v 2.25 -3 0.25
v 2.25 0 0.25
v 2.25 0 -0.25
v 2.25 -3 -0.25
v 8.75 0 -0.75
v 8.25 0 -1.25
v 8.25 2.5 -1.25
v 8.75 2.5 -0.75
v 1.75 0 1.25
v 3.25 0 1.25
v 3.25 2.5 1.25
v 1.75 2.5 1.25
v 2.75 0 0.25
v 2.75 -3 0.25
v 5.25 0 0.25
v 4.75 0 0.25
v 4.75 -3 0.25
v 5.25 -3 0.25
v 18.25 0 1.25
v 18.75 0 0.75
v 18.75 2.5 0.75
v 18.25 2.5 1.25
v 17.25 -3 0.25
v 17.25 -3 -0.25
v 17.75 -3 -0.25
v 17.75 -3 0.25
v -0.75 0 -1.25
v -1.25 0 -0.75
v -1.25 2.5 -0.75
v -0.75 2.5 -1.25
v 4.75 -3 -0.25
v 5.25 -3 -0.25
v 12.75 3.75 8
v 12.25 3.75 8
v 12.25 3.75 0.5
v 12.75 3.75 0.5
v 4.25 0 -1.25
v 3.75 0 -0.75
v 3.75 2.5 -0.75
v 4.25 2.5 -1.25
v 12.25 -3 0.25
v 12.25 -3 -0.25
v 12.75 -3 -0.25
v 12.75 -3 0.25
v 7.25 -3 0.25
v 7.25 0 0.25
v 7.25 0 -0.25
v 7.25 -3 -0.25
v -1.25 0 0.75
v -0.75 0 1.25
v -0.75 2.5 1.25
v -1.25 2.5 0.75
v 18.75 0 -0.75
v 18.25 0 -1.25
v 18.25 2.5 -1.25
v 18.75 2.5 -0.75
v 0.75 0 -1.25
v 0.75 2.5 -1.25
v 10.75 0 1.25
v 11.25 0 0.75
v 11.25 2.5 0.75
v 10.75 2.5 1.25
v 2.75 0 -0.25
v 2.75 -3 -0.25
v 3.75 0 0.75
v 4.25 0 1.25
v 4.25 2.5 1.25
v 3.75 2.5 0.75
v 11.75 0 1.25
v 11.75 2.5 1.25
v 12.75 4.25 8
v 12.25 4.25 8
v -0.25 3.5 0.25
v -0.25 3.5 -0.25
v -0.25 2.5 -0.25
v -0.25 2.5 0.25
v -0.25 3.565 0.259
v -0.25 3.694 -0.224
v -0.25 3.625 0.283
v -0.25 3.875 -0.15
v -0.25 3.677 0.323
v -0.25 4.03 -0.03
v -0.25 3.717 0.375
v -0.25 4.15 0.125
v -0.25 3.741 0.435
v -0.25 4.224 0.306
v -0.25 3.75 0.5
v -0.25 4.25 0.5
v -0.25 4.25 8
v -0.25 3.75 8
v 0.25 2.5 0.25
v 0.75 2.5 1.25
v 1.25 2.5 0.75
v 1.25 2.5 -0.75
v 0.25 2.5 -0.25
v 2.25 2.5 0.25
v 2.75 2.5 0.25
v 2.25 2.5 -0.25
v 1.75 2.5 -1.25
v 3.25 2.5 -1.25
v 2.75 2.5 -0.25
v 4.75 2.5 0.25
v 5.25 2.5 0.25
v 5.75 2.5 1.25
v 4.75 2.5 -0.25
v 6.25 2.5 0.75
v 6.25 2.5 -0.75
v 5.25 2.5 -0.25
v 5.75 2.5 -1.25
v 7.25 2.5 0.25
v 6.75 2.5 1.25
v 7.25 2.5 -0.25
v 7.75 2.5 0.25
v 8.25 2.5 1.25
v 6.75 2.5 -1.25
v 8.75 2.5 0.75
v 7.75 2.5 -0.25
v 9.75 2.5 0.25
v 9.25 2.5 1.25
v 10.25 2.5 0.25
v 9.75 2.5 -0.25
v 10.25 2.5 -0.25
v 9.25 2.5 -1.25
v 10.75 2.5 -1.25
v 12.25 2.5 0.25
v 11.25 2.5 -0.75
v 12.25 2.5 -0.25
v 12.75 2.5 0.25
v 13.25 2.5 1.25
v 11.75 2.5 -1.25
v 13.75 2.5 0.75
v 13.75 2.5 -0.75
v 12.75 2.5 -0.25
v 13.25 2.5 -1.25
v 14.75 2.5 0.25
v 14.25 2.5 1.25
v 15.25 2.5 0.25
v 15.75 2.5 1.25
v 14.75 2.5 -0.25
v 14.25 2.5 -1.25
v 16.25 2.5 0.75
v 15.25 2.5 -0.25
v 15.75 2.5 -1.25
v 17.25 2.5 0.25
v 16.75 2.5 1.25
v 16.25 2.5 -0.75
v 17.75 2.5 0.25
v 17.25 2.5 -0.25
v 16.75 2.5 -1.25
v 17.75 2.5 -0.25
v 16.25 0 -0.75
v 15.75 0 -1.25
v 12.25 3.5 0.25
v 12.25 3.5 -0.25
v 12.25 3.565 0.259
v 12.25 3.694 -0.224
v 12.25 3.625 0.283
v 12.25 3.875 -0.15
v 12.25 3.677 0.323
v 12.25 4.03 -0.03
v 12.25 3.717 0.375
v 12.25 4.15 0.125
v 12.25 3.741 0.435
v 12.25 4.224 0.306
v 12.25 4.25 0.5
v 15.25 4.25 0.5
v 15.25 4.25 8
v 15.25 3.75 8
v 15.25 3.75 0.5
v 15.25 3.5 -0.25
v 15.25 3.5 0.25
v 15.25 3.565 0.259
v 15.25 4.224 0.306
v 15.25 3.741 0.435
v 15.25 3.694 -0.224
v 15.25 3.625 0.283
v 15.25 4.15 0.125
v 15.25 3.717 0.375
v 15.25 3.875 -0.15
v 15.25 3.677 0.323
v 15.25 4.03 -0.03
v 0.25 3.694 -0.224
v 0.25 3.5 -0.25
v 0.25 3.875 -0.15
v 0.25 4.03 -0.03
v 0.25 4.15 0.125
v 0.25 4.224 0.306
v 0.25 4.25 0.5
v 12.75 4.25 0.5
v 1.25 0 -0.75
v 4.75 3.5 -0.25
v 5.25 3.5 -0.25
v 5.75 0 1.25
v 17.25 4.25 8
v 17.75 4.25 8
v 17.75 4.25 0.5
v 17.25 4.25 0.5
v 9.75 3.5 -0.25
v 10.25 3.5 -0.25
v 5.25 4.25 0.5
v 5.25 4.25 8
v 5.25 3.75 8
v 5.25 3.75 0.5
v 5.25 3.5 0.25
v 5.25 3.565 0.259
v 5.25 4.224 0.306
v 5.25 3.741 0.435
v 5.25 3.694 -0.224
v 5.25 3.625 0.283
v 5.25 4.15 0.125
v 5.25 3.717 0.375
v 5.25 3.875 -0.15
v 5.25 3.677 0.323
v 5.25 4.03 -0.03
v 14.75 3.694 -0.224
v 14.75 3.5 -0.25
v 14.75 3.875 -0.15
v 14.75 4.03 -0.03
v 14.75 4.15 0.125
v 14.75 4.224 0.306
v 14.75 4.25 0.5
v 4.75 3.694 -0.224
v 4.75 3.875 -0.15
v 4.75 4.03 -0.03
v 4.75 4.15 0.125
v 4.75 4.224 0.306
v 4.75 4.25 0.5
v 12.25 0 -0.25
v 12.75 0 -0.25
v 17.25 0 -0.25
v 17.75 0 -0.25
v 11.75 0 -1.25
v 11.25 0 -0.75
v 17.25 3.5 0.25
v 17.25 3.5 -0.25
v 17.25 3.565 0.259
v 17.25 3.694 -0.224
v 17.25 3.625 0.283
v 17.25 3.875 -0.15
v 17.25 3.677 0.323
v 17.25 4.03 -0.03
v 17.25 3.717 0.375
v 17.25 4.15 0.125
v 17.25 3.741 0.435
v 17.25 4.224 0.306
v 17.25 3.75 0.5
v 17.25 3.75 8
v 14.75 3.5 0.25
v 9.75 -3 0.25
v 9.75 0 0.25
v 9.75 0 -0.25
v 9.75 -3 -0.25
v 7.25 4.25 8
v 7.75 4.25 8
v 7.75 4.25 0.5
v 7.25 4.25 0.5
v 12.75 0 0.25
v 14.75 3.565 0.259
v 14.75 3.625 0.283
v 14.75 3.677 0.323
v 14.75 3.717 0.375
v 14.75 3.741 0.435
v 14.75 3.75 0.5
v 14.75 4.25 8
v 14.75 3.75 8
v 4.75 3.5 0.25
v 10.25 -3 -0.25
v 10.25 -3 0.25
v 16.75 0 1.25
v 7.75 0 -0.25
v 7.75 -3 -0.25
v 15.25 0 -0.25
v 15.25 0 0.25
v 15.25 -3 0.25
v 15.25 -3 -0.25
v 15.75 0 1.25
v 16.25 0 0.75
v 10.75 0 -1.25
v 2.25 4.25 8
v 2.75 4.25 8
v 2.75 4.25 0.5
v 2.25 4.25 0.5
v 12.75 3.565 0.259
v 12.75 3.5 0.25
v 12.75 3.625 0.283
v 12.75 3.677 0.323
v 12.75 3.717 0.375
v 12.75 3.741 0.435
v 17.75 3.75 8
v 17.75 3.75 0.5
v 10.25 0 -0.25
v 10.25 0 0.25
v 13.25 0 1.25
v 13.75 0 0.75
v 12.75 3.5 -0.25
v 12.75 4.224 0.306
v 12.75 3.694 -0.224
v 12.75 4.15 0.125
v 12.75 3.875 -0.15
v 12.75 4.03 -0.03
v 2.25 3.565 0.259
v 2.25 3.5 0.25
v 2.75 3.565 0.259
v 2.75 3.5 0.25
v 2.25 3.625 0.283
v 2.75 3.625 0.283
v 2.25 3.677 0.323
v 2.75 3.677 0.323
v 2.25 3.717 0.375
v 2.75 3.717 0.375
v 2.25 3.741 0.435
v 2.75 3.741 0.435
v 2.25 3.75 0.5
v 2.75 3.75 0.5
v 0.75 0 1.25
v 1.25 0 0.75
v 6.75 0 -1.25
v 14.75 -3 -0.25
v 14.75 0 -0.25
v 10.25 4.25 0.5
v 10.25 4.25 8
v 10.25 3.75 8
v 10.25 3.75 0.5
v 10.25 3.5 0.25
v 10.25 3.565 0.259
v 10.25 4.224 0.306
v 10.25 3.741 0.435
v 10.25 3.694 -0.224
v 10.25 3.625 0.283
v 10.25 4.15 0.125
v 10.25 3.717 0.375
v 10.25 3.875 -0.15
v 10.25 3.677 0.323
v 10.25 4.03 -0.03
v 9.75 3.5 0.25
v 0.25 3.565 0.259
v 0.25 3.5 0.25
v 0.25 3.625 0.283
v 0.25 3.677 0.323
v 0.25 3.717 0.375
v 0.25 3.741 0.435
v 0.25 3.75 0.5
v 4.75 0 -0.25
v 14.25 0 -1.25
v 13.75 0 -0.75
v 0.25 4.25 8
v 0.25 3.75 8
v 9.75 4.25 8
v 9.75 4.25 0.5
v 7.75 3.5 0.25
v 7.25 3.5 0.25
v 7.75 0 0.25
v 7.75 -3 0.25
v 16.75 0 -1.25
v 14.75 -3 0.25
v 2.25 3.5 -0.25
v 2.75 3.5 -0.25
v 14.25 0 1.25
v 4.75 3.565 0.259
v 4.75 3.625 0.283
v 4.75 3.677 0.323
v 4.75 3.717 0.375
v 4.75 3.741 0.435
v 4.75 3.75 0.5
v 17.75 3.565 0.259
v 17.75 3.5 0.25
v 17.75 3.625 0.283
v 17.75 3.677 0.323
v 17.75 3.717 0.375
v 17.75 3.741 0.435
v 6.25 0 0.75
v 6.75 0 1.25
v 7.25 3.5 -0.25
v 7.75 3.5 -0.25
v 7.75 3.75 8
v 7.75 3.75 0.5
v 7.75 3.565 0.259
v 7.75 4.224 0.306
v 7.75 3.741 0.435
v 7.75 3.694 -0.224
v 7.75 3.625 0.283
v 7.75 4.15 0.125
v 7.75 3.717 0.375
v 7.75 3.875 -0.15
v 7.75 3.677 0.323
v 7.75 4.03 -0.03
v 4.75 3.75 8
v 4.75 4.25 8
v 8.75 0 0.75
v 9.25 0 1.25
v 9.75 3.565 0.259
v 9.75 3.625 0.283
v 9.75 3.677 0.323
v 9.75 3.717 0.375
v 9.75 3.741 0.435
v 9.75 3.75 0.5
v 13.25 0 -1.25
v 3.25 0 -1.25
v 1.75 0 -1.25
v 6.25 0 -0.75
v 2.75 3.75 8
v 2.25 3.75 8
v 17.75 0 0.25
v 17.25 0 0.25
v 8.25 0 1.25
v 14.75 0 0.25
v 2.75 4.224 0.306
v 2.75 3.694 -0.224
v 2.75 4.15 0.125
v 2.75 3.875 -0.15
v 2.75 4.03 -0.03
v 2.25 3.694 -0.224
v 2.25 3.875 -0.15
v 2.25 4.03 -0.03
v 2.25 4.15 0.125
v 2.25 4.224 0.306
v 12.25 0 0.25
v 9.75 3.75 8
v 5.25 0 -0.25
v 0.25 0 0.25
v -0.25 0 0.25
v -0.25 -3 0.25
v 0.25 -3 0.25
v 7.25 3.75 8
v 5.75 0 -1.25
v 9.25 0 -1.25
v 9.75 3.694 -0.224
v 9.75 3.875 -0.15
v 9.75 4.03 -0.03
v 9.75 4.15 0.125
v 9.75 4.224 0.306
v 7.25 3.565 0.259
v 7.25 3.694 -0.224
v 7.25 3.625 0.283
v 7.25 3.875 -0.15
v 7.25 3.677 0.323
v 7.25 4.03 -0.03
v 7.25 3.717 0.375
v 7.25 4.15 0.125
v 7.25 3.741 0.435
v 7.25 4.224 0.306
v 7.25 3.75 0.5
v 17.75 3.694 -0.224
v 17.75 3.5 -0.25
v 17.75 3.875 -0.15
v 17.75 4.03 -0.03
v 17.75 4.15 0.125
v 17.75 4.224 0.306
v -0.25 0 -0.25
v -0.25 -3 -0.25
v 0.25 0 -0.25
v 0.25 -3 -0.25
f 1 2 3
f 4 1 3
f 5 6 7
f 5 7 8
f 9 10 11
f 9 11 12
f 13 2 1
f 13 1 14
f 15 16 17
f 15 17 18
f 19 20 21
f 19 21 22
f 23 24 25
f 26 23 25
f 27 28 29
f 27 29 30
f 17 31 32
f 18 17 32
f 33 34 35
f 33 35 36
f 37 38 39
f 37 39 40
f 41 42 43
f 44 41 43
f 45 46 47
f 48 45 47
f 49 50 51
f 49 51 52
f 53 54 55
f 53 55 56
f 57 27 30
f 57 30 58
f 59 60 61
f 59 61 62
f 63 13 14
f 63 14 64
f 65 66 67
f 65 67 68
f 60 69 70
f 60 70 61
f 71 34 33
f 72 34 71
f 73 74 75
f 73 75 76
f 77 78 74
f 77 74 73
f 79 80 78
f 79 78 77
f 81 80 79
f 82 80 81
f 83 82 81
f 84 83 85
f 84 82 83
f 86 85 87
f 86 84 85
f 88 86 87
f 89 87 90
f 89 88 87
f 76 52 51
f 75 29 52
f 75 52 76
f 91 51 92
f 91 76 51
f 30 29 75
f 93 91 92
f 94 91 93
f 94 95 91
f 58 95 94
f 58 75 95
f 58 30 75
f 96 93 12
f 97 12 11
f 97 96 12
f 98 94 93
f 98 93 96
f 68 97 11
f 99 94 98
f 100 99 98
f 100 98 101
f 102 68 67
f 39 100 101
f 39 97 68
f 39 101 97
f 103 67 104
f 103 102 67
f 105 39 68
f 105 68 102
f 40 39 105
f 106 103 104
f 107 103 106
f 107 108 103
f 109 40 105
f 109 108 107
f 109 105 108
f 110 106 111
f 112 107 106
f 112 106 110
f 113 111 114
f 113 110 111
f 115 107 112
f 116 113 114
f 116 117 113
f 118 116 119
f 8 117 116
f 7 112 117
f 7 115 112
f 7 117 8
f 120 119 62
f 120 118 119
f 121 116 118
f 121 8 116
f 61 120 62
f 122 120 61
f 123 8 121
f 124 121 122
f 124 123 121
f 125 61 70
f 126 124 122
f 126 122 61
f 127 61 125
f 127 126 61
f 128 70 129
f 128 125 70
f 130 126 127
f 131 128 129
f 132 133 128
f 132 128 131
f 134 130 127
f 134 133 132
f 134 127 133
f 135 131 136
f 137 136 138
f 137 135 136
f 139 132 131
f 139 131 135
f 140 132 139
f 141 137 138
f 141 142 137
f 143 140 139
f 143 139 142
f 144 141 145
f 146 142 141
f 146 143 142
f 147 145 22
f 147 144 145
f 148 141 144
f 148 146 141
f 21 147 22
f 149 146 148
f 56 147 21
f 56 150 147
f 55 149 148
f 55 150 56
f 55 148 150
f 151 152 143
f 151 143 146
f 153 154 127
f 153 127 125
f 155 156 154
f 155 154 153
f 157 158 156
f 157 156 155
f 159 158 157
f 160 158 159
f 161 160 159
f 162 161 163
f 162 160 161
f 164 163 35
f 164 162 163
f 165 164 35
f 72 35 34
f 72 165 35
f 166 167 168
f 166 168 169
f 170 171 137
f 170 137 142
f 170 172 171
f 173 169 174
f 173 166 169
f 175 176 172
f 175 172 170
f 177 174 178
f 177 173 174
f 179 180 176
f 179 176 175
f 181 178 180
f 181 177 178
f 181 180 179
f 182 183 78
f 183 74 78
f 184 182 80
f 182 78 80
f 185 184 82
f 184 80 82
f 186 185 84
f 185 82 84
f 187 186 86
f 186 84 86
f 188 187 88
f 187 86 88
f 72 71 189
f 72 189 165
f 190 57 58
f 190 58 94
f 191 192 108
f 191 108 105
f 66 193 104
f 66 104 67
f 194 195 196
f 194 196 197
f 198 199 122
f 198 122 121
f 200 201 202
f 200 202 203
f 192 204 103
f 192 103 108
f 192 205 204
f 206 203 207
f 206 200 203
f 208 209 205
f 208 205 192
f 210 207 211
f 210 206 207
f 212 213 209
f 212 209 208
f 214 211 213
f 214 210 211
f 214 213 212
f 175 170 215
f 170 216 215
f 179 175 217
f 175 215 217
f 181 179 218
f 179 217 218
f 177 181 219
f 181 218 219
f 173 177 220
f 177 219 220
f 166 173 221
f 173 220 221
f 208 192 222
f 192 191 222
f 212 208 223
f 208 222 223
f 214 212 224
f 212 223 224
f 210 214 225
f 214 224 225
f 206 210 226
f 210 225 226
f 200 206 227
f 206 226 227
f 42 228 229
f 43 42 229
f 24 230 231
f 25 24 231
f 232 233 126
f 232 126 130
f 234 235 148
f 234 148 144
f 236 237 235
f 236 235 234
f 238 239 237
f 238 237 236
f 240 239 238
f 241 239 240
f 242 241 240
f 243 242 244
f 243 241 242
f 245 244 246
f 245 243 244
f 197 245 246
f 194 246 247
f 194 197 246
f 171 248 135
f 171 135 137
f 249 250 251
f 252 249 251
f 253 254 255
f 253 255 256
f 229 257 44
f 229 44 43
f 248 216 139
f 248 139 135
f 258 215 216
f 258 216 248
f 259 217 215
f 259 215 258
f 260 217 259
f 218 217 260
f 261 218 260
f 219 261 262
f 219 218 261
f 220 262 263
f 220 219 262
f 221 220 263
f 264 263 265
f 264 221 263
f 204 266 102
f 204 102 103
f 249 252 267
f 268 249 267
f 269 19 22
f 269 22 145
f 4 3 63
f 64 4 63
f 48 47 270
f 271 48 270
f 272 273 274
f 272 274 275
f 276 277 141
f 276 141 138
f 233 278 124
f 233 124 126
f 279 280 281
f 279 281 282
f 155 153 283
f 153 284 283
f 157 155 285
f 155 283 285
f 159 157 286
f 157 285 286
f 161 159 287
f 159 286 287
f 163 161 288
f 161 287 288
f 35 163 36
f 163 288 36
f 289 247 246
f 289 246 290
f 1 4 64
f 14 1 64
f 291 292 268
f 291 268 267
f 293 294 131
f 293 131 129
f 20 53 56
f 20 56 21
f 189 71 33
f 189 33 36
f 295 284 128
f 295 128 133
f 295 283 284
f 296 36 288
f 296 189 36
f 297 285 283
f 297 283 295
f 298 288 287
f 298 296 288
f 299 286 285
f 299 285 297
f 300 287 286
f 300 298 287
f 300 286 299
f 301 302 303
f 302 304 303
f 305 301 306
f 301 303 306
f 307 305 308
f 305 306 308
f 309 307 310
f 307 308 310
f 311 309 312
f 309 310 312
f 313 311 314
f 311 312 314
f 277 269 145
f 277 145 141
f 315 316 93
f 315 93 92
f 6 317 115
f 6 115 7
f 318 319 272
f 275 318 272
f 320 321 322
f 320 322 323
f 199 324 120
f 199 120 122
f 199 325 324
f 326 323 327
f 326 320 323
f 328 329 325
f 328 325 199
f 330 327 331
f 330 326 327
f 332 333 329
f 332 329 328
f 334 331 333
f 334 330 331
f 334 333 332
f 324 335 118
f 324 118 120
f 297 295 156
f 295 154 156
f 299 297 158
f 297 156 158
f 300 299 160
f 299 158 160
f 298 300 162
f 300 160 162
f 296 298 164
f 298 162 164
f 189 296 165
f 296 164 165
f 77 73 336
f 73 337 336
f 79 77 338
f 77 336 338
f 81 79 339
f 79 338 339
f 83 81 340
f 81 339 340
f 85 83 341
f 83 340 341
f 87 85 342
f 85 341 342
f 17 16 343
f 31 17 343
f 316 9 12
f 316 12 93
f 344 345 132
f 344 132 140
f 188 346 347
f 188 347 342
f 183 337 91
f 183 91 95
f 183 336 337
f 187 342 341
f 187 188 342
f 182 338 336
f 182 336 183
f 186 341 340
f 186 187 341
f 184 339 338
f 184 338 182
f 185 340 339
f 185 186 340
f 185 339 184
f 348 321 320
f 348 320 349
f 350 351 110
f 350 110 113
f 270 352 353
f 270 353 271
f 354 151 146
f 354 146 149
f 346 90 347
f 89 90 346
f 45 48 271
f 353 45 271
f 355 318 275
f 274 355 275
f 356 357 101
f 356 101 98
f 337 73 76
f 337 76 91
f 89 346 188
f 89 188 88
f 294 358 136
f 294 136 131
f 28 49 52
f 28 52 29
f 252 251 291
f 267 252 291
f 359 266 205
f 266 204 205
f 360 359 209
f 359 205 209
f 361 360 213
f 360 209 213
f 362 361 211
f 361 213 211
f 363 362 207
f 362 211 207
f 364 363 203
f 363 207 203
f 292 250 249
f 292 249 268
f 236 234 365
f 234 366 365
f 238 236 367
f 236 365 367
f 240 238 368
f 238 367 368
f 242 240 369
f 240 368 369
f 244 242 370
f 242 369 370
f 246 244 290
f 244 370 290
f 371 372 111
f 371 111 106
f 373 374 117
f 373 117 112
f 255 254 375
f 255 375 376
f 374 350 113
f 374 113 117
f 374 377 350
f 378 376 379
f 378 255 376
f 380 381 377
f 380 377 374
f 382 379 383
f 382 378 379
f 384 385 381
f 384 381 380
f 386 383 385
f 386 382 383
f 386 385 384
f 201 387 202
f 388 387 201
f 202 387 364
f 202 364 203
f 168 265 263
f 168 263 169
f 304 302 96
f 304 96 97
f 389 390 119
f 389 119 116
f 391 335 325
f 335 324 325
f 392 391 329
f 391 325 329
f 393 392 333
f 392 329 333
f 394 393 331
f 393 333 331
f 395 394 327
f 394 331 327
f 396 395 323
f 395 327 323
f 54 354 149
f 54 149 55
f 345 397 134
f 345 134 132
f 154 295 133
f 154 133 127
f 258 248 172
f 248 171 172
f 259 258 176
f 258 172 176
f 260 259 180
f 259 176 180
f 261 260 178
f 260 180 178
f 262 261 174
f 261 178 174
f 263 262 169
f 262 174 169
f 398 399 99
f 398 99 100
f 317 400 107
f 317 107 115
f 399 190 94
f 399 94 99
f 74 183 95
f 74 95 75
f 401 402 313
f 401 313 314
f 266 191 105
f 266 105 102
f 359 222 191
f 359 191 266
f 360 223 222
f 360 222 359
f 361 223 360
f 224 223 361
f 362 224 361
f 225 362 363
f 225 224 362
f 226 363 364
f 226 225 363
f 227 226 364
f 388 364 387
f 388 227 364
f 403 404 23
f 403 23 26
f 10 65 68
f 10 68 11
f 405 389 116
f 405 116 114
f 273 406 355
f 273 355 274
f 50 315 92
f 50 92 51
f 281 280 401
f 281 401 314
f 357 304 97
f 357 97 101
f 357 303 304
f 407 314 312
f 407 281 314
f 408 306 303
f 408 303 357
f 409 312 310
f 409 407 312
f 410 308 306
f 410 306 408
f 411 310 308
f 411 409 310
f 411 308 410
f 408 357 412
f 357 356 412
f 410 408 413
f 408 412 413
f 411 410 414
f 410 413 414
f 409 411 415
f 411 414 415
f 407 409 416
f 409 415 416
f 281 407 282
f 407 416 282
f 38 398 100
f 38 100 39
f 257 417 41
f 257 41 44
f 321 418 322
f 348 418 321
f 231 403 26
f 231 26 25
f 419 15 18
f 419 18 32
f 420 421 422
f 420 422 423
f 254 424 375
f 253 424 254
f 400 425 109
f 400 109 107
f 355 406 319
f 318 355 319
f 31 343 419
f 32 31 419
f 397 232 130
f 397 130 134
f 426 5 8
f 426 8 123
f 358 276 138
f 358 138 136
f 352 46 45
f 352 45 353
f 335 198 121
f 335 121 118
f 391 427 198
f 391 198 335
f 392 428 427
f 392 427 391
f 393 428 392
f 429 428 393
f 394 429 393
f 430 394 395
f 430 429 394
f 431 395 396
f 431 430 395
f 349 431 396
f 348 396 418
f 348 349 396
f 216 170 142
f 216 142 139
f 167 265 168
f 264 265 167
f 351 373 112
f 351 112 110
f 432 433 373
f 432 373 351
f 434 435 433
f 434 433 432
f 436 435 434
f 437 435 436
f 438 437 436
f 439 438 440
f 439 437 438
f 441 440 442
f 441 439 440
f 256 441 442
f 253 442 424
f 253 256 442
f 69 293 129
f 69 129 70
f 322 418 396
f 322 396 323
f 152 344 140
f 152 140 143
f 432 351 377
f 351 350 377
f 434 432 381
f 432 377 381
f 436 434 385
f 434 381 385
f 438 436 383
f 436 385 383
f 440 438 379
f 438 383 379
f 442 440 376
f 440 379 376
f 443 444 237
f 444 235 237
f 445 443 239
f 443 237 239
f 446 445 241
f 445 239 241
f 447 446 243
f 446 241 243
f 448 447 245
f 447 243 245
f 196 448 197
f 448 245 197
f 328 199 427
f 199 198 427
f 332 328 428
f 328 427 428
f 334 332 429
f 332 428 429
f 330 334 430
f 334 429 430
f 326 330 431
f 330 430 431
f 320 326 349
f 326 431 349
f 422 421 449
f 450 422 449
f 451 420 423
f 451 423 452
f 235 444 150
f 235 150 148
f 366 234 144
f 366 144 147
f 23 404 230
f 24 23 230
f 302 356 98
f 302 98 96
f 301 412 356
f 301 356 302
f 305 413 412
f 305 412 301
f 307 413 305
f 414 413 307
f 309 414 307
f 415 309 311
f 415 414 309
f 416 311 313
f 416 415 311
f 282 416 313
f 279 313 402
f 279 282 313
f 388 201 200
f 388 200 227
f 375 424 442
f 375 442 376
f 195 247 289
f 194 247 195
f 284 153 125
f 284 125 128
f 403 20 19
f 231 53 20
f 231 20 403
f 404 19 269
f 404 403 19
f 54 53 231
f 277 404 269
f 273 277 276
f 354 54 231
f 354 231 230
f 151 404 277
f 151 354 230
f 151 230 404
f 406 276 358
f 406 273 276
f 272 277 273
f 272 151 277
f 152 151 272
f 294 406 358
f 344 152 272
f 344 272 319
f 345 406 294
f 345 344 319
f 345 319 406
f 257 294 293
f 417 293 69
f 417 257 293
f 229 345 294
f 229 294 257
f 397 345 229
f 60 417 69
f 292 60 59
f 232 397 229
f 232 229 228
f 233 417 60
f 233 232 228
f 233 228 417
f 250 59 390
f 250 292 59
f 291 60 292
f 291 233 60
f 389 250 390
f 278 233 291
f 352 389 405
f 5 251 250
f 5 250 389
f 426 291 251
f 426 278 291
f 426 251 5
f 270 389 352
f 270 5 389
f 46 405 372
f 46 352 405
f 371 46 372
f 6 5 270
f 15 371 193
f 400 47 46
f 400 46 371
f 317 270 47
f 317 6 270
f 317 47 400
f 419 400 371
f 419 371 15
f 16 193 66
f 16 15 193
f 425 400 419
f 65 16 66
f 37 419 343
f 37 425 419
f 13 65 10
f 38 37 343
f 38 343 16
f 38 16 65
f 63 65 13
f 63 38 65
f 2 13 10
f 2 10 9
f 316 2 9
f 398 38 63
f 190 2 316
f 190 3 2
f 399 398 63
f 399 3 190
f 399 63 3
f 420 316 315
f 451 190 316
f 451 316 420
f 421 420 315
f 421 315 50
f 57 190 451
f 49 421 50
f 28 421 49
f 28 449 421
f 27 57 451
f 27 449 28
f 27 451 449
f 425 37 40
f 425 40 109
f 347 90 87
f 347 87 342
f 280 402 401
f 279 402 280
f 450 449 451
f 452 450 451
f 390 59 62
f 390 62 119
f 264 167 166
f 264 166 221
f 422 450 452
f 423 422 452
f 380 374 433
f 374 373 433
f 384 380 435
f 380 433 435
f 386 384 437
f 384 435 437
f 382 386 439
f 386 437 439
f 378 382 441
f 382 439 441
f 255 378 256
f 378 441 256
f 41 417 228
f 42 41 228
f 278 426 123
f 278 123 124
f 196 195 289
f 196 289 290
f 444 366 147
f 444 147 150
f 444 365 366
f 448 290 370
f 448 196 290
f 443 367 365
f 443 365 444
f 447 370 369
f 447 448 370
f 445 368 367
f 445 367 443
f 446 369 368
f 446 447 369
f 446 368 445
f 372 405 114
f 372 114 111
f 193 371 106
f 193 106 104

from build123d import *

# Parameters (mm, degrees)
BOSS_EXTRUDE1_DEPTH = 2.5
SKETCH2_W           = 0.5
SKETCH2_H           = 0.5
BOSS_EXTRUDE3_DEPTH = 5.5
SKETCH2_3_W         = 0.5
SKETCH2_3_H         = 0.5


with BuildPart() as part:
    # Sketch1 → Boss-Extrude1 (new body)
    with BuildSketch(Plane(origin=(0, 0, 0), x_dir=(1, 0, 0), z_dir=(0, 1, 0))):
        Polygon((-1.25, 0.75), (-0.75, 1.25), (0.75, 1.25), (1.25, 0.75), (1.75, 1.25), (3.25, 1.25), (3.75, 0.75), (4.25, 1.25), (5.75, 1.25), (6.25, 0.75), (6.75, 1.25), (8.25, 1.25), (8.75, 0.75), (9.25, 1.25), (10.75, 1.25), (11.25, 0.75), (11.75, 1.25), (13.25, 1.25), (13.75, 0.75), (14.25, 1.25), (15.75, 1.25), (16.25, 0.75), (16.75, 1.25), (18.25, 1.25), (18.75, 0.75), (18.75, -0.75), (18.25, -1.25), (16.75, -1.25), (16.25, -0.75), (15.75, -1.25), (14.25, -1.25), (13.75, -0.75), (13.25, -1.25), (11.75, -1.25), (11.25, -0.75), (10.75, -1.25), (9.25, -1.25), (8.75, -0.75), (8.25, -1.25), (6.75, -1.25), (6.25, -0.75), (5.75, -1.25), (4.25, -1.25), (3.75, -0.75), (3.25, -1.25), (1.75, -1.25), (1.25, -0.75), (0.75, -1.25), (-0.75, -1.25), (-1.25, -0.75), align=None)
    extrude(amount=BOSS_EXTRUDE1_DEPTH)

    # Sketch2 → Boss-Extrude3 (add)
    with BuildSketch(Plane(origin=(0, 2.5, 0), x_dir=(1, 0, 0), z_dir=(0, 1, 0))):
        with Locations((2.5, 0)):
            Rectangle(SKETCH2_W, SKETCH2_H)
        Rectangle(SKETCH2_W, SKETCH2_H)
        with Locations((5, 0)):
            Rectangle(SKETCH2_W, SKETCH2_H)
        with Locations((7.5, 0)):
            Rectangle(SKETCH2_W, SKETCH2_H)
        with Locations((10, 0)):
            Rectangle(SKETCH2_W, SKETCH2_H)
        with Locations((12.5, 0)):
            Rectangle(SKETCH2_W, SKETCH2_H)
        with Locations((15, 0)):
            Rectangle(SKETCH2_W, SKETCH2_H)
        with Locations((17.5, 0)):
            Rectangle(SKETCH2_W, SKETCH2_H)
    extrude(amount=-BOSS_EXTRUDE3_DEPTH)

    # Sweep1: sweep along a path in Sketch3
    with BuildLine(Plane(origin=(0, 0, 0), x_dir=(0, 0, -1), z_dir=(1, 0, 0))) as sweep1_path:
        Line((0, 2.5), (0, 3.5))
        ThreePointArc((0, 3.5), (-0.146446609, 3.853553391), (-0.5, 4))
        Line((-0.5, 4), (-8, 4))
    # Sketch2<3> → Sweep1 (sweep)
    with BuildSketch(Plane(origin=(0, 2.5, 0), x_dir=(1, 0, 0), z_dir=(0, 1, 0))):
        with Locations((2.5, 0)):
            Rectangle(SKETCH2_3_W, SKETCH2_3_H)
        Rectangle(SKETCH2_3_W, SKETCH2_3_H)
        with Locations((5, 0)):
            Rectangle(SKETCH2_3_W, SKETCH2_3_H)
        with Locations((7.5, 0)):
            Rectangle(SKETCH2_3_W, SKETCH2_3_H)
        with Locations((10, 0)):
            Rectangle(SKETCH2_3_W, SKETCH2_3_H)
        with Locations((12.5, 0)):
            Rectangle(SKETCH2_3_W, SKETCH2_3_H)
        with Locations((15, 0)):
            Rectangle(SKETCH2_3_W, SKETCH2_3_H)
        with Locations((17.5, 0)):
            Rectangle(SKETCH2_3_W, SKETCH2_3_H)
    sweep(path=sweep1_path.line)


solid = part.part
